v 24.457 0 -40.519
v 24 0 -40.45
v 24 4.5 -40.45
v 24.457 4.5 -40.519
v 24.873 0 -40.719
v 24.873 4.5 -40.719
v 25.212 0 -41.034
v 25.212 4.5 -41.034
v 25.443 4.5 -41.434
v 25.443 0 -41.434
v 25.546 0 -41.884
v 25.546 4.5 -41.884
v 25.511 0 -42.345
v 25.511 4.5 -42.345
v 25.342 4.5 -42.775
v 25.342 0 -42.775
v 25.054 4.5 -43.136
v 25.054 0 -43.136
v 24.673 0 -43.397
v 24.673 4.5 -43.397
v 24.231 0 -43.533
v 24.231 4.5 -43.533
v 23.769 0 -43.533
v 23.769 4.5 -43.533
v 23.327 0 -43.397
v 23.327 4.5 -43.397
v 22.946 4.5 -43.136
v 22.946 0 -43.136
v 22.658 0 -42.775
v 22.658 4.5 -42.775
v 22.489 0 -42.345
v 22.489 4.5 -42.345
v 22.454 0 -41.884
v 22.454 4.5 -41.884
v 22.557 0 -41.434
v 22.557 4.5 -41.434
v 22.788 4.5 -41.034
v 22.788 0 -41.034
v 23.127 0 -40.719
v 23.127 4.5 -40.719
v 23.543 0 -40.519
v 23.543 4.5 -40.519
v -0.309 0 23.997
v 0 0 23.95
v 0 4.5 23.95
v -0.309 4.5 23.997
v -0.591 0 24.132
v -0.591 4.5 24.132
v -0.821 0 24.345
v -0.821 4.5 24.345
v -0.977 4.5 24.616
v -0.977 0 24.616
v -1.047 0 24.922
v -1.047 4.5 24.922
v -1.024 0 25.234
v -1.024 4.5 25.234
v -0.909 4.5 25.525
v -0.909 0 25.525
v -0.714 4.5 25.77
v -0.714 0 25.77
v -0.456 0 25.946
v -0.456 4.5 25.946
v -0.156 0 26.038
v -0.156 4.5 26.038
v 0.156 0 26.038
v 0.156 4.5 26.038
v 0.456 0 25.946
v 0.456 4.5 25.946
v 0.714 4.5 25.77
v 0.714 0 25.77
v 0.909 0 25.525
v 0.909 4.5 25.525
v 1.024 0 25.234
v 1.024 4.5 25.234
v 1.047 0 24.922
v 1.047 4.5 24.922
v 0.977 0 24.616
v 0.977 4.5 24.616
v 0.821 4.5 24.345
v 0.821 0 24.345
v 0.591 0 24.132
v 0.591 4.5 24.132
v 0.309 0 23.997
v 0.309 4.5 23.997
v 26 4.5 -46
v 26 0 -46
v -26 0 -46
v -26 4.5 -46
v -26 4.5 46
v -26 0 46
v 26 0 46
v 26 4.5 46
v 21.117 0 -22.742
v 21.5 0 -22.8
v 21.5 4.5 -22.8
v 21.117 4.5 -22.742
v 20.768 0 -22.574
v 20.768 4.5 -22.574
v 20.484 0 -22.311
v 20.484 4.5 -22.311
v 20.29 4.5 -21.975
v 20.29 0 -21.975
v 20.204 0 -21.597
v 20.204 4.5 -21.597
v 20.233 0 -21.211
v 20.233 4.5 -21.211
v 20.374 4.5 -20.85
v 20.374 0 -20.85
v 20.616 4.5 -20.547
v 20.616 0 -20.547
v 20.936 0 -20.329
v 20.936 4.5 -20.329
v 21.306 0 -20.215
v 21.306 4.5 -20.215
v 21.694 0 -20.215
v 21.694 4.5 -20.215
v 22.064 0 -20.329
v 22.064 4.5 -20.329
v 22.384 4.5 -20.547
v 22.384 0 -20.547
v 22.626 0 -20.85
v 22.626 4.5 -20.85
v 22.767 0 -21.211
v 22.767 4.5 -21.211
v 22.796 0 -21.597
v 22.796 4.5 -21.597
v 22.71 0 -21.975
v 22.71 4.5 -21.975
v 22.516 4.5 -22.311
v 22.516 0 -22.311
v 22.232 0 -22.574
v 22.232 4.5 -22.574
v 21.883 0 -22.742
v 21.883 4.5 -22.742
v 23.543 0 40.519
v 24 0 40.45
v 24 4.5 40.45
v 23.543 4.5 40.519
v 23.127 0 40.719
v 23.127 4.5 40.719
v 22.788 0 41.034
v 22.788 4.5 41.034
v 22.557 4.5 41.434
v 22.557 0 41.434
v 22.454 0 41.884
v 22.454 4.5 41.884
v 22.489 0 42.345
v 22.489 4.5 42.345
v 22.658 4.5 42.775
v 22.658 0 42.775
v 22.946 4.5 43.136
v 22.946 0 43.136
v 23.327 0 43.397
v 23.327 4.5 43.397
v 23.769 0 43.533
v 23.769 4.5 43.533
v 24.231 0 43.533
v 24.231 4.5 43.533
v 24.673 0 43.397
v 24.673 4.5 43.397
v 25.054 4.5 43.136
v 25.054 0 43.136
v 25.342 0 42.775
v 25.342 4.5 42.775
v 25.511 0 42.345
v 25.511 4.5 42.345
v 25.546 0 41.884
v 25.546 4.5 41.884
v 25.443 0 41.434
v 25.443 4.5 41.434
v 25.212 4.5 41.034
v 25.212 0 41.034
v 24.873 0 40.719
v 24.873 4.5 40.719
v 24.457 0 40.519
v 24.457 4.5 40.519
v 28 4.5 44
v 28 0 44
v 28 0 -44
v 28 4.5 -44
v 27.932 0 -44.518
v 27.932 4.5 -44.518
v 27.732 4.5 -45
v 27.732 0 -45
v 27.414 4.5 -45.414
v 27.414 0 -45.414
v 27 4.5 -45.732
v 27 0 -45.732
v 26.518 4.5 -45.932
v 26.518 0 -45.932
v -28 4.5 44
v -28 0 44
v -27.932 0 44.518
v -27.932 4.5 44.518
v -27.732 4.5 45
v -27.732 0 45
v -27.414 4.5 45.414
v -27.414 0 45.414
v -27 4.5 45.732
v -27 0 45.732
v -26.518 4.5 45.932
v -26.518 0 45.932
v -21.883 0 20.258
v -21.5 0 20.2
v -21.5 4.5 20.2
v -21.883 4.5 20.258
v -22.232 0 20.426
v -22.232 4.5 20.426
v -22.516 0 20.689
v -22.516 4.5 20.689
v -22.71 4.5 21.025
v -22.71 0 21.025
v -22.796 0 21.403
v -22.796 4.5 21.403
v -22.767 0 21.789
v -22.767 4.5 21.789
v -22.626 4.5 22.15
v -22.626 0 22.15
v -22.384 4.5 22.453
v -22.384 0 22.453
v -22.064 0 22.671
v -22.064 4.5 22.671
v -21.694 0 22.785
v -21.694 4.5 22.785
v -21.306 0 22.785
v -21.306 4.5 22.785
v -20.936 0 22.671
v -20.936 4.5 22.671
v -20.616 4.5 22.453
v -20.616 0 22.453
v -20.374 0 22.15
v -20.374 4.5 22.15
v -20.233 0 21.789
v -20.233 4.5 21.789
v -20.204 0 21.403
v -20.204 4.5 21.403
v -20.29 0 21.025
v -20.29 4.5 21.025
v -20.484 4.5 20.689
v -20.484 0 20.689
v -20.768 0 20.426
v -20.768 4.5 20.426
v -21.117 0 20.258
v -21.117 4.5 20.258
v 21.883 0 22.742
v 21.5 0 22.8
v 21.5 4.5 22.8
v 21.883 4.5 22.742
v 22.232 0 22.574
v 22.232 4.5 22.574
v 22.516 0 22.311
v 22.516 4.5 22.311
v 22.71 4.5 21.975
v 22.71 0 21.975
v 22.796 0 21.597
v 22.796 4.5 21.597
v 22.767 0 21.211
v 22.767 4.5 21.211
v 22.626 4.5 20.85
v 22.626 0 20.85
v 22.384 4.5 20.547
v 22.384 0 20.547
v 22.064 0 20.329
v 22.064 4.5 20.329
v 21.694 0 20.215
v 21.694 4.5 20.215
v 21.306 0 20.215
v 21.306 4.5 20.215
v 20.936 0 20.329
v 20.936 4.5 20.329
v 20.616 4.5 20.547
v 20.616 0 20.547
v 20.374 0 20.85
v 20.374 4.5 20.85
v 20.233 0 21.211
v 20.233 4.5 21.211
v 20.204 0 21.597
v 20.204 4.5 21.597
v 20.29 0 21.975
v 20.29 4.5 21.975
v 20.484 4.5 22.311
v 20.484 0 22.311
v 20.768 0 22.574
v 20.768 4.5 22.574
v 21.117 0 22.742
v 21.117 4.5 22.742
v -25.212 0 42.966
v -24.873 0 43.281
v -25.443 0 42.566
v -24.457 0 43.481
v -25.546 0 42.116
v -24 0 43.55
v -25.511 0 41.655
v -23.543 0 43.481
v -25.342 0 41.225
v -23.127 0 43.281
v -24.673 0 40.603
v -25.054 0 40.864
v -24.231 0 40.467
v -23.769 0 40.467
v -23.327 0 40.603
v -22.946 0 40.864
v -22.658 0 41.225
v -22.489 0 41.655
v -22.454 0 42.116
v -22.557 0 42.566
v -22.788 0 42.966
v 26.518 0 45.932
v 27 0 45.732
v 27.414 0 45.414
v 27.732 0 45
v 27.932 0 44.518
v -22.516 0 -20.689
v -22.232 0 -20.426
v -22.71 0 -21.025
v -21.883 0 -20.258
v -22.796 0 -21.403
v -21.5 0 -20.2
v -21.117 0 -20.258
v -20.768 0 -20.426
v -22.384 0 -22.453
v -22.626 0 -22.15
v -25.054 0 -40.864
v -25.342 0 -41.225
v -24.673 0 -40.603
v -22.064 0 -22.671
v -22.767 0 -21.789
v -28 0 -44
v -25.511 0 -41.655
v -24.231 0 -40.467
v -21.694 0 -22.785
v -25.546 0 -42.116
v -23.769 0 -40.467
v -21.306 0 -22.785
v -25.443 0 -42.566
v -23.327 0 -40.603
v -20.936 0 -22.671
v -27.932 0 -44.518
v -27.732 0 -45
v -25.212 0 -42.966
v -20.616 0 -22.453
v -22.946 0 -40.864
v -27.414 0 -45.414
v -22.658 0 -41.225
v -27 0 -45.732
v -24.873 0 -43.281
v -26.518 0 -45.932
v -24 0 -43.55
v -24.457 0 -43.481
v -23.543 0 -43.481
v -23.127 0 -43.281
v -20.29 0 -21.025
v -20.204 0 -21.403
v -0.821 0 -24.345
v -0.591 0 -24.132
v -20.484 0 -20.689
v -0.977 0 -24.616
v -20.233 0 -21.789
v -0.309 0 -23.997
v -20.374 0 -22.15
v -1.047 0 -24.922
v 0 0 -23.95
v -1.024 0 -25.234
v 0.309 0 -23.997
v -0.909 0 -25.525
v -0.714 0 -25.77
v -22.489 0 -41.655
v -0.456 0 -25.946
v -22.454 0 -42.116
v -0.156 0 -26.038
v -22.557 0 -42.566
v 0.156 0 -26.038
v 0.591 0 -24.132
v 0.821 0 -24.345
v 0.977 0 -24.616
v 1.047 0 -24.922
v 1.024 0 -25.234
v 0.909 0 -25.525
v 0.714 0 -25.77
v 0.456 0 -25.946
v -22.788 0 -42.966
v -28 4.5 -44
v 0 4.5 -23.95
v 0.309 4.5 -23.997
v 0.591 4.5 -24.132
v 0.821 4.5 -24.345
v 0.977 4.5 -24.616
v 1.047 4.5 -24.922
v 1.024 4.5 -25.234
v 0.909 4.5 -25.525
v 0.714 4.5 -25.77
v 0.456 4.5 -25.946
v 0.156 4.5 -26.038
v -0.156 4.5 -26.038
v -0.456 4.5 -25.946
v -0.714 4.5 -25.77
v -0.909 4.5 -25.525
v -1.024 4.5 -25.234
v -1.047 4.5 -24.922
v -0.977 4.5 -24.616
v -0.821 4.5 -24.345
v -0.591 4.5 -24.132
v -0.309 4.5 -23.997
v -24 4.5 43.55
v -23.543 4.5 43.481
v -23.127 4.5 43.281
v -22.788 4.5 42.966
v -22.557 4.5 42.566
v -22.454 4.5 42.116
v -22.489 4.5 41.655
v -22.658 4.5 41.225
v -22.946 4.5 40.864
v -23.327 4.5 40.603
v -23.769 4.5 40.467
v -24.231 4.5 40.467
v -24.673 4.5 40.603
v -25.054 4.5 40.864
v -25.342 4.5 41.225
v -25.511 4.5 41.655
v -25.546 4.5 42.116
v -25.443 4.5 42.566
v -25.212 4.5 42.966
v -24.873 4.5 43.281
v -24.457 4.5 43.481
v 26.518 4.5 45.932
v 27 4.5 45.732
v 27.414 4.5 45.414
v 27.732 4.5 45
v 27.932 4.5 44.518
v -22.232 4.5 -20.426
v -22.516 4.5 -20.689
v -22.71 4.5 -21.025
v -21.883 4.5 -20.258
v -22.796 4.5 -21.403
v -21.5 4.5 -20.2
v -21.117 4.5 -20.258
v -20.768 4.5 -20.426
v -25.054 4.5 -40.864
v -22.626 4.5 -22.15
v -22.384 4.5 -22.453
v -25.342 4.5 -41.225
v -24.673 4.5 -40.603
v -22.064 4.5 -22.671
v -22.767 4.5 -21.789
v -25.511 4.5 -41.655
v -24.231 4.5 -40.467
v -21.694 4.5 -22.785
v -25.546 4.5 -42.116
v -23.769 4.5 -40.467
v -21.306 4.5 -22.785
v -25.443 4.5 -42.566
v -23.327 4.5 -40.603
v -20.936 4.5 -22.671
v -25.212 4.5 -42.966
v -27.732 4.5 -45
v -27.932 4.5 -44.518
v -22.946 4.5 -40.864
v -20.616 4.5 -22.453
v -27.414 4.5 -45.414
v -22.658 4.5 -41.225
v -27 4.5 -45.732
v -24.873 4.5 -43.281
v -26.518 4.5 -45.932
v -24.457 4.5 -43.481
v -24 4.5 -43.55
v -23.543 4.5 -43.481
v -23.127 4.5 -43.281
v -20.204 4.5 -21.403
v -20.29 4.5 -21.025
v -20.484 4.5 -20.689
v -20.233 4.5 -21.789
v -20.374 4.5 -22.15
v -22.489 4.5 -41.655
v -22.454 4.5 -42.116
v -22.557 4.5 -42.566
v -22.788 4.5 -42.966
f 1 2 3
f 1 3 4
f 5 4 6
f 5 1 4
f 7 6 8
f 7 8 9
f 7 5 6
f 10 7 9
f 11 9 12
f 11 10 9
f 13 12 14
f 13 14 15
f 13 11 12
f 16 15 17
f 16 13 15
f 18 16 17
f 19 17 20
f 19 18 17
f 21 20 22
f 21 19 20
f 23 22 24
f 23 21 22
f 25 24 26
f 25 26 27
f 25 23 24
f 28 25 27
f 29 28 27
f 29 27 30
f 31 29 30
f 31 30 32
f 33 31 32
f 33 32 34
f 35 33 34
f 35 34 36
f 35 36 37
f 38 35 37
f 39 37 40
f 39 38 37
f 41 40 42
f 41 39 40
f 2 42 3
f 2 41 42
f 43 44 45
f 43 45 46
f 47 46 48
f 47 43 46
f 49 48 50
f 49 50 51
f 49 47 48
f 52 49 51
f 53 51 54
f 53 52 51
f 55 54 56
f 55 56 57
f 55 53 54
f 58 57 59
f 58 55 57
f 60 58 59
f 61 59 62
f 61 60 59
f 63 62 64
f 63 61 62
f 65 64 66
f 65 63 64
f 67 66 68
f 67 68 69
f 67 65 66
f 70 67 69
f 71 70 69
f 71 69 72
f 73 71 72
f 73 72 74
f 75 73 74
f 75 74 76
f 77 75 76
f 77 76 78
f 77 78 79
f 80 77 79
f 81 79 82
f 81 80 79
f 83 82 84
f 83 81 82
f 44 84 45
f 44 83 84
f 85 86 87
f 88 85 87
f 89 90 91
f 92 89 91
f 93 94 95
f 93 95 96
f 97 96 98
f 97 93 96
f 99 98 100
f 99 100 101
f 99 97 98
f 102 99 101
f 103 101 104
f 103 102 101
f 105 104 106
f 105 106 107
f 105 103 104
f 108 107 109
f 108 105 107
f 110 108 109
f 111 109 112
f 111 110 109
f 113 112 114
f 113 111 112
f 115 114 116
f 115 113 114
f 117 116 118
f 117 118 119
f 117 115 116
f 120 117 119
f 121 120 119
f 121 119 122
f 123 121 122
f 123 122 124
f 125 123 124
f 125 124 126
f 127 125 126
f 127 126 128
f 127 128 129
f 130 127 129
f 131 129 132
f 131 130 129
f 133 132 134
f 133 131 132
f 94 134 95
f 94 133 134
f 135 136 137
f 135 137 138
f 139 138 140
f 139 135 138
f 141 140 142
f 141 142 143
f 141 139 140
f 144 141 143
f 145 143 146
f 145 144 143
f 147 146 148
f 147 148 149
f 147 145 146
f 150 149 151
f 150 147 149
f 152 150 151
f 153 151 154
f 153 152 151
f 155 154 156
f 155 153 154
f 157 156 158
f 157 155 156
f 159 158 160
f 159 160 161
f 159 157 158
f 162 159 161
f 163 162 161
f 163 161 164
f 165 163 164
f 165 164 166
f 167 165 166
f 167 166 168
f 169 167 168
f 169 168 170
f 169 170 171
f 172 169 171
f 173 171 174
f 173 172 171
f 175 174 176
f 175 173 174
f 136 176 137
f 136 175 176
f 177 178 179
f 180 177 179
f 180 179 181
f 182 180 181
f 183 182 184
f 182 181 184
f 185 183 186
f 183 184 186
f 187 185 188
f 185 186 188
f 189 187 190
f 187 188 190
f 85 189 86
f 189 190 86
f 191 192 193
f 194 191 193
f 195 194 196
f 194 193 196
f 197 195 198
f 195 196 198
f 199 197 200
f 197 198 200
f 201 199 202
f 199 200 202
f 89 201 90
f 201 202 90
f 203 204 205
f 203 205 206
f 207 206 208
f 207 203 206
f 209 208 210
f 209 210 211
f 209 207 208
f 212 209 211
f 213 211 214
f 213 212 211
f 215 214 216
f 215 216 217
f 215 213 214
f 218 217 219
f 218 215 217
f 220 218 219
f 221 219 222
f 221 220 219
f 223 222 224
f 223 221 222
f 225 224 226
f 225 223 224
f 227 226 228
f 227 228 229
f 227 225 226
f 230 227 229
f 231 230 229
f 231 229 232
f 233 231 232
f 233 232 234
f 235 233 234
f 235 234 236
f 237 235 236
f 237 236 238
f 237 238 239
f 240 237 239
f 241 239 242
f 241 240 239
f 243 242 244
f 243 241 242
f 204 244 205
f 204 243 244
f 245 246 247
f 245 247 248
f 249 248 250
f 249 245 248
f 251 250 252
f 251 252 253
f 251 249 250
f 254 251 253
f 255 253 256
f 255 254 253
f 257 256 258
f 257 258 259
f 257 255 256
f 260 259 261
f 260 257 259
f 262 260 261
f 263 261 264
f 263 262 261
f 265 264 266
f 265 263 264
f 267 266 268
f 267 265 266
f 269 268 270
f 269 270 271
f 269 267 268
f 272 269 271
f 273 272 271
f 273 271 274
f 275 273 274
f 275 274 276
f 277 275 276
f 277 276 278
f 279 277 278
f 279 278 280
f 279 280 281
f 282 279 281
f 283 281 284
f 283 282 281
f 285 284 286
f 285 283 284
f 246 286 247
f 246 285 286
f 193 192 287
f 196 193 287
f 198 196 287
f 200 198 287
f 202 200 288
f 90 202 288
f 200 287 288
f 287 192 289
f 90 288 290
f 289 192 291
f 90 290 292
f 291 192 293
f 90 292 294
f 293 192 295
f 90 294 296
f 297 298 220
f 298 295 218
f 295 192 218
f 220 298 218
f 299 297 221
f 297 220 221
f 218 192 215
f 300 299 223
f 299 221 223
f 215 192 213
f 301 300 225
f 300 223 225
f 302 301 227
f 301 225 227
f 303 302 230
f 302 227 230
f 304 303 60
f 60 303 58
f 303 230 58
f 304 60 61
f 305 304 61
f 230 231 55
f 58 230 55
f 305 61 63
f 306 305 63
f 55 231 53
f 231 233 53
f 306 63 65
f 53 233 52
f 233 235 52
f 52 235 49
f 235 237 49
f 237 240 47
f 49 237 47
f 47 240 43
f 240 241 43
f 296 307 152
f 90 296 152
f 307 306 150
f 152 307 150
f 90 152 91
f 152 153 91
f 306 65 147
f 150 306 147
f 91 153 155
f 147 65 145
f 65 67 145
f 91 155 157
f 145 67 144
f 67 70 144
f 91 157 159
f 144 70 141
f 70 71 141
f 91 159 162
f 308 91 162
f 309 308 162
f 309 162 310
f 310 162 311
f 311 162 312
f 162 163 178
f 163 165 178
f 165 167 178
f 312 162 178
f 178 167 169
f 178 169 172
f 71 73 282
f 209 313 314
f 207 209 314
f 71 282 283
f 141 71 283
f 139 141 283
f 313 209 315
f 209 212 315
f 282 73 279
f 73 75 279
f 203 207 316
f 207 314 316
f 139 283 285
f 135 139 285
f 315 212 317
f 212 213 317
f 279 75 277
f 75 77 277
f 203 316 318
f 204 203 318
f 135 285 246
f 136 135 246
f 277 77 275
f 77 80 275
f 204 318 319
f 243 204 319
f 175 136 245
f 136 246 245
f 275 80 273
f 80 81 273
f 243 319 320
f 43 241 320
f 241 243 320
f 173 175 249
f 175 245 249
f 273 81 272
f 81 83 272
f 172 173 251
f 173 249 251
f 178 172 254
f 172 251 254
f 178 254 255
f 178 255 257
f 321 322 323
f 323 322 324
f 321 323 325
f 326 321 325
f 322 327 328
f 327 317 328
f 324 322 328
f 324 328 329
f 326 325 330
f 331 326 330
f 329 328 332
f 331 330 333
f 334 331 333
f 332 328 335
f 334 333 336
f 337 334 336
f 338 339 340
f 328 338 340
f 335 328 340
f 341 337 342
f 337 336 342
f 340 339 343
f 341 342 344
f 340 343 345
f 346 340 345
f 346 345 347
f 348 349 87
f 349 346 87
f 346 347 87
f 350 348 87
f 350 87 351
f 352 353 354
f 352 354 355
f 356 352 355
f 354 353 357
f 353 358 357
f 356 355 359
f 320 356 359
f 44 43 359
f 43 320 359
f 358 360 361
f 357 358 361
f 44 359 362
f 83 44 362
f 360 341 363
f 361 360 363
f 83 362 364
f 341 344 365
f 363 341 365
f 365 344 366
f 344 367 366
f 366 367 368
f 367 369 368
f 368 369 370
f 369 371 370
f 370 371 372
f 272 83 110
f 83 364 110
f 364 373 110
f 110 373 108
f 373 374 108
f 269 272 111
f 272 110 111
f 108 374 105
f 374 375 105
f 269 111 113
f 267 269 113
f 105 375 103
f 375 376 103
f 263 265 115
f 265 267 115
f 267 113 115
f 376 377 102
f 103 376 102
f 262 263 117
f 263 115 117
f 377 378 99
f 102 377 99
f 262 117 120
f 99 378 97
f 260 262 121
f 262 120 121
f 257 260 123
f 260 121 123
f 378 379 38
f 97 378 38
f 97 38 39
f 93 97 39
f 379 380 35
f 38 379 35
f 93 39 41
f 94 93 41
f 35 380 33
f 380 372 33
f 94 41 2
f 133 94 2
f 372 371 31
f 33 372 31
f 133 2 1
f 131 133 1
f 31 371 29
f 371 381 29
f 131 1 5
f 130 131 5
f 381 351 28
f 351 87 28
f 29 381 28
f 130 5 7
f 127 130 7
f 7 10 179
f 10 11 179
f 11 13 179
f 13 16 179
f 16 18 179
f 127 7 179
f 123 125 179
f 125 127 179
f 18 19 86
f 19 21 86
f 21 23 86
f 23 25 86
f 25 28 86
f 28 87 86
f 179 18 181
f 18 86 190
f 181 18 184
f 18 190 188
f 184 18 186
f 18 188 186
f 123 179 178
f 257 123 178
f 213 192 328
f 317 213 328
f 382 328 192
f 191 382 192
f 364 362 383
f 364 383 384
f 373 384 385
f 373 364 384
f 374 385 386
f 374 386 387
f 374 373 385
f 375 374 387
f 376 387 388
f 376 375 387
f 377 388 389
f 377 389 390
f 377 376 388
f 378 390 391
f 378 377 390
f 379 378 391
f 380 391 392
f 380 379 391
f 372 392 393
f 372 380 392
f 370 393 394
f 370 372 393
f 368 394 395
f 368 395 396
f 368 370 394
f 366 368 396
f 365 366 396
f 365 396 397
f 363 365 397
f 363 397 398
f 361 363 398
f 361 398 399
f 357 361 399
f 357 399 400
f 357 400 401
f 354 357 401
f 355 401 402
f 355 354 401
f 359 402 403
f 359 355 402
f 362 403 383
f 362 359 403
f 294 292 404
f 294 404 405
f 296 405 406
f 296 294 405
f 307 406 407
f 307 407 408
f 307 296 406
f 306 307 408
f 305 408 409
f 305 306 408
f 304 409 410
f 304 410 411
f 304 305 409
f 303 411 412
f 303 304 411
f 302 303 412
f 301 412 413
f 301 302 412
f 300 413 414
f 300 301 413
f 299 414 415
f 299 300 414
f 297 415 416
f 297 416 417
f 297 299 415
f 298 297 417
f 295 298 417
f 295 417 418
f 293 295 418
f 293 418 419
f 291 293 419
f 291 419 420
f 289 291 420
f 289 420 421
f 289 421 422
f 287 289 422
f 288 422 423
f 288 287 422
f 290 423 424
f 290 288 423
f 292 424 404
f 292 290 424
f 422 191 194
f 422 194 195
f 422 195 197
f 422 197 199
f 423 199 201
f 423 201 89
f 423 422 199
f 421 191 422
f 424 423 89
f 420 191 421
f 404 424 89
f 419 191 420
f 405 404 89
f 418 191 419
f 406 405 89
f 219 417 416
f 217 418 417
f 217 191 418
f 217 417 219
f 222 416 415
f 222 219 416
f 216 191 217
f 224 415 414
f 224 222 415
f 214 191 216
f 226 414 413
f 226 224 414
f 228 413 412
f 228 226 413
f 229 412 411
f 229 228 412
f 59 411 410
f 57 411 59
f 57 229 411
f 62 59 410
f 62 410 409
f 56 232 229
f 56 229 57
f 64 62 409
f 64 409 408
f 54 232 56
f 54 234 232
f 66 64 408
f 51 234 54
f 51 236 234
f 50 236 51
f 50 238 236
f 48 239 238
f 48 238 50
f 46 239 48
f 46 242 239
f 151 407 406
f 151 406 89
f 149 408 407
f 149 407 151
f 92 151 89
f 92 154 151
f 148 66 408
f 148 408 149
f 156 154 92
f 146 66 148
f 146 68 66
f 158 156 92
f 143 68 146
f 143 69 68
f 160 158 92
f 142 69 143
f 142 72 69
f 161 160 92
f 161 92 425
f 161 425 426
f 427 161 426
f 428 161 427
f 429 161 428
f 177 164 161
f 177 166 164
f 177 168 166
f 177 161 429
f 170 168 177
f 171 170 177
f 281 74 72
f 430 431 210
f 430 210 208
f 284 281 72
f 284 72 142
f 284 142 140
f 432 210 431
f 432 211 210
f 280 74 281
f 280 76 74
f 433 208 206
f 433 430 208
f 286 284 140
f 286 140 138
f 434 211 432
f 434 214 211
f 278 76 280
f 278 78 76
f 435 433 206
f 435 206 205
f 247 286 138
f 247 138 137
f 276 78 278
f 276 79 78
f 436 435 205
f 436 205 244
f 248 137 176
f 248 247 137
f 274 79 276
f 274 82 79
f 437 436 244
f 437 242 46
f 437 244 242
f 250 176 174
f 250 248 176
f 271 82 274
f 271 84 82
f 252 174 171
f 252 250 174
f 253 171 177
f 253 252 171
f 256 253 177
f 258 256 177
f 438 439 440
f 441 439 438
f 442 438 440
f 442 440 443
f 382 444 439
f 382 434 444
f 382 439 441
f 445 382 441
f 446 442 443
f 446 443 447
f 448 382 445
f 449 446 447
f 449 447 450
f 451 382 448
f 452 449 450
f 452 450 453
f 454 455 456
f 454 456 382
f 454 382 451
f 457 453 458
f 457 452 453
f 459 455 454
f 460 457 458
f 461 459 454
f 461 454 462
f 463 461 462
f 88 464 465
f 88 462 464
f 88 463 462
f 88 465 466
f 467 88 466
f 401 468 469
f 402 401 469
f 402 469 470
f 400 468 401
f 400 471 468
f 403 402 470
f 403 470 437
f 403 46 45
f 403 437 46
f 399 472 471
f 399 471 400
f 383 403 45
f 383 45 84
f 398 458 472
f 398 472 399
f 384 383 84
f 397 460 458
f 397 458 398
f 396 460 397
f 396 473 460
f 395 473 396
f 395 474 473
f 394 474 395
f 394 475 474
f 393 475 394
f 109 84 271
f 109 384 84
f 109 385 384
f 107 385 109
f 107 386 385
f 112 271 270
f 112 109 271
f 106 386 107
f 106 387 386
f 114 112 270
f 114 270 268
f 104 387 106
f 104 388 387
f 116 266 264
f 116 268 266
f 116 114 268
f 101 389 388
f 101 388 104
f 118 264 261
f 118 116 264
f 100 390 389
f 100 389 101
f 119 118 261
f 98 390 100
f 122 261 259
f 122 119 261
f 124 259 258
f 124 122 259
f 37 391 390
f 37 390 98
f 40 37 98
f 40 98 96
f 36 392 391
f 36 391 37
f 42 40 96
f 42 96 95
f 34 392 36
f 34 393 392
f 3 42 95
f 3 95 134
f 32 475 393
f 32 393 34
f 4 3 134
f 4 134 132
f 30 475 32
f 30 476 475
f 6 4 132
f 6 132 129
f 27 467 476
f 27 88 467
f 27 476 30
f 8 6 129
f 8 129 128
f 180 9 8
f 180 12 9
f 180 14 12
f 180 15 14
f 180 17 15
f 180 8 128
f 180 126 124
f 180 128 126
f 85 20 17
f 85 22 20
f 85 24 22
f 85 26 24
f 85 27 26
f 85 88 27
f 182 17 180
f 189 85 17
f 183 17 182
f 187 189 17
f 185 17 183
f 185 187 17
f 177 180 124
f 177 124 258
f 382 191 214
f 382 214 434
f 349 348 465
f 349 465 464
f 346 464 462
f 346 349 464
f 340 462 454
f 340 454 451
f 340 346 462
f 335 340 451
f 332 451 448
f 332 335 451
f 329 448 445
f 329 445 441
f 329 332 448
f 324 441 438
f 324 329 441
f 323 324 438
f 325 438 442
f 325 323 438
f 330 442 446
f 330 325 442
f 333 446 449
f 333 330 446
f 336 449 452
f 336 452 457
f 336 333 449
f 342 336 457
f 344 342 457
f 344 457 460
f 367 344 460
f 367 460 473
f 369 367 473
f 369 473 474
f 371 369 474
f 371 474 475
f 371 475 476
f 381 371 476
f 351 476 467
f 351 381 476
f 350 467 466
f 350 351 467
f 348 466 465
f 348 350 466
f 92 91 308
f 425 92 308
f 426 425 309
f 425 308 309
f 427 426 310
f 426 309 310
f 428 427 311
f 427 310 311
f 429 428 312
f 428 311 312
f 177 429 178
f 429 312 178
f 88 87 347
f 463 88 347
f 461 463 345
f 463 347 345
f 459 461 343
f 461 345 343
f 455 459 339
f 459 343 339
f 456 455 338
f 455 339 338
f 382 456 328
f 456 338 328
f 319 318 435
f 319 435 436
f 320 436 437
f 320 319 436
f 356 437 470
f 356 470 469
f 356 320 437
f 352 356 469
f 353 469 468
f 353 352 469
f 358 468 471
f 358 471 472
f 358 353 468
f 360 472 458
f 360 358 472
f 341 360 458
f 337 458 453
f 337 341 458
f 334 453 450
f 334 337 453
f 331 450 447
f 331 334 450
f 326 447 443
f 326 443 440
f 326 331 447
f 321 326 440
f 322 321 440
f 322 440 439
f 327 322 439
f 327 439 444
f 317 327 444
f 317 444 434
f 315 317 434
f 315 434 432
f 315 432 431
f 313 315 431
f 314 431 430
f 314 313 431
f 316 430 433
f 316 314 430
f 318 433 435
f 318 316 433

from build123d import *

# Parameters (mm, degrees)
SKETCH1_R           = 1.55
SKETCH1_R_2         = 1.3
SKETCH1_R_3         = 1.05
BOSS_EXTRUDE1_DEPTH = 4.5


with BuildPart() as part:
    # Sketch1 → Boss-Extrude1 (new body)
    with BuildSketch(Plane(origin=(0, 0, 0), x_dir=(1, 0, 0), z_dir=(0, 1, 0))):
        with BuildLine():
            Line((-26, -46), (26, -46))
            ThreePointArc((26, -46), (27.414213562, -45.414213562), (28, -44))
            Line((28, -44), (28, 44))
            ThreePointArc((28, 44), (27.414213562, 45.414213562), (26, 46))
            Line((26, 46), (-26, 46))
            ThreePointArc((-26, 46), (-27.414213562, 45.414213562), (-28, 44))
            Line((-28, 44), (-28, -44))
            ThreePointArc((-28, -44), (-27.414213562, -45.414213562), (-26, -46))
        make_face()
        with Locations(Location((24, 42, 0), (0, 0, 270))):
            Circle(SKETCH1_R, mode=Mode.SUBTRACT)
        with Locations(Location((24, -42, 0), (0, 0, 90))):
            Circle(SKETCH1_R, mode=Mode.SUBTRACT)
        with Locations(Location((-24, 42, 0), (0, 0, 90))):
            Circle(SKETCH1_R, mode=Mode.SUBTRACT)
        with Locations(Location((-24, -42, 0), (0, 0, 270))):
            Circle(SKETCH1_R, mode=Mode.SUBTRACT)
        with Locations(Location((-21.5, 21.5, 0), (0, 0, 270))):
            Circle(SKETCH1_R_2, mode=Mode.SUBTRACT)
        with Locations(Location((21.5, 21.5, 0), (0, 0, 90))):
            Circle(SKETCH1_R_2, mode=Mode.SUBTRACT)
        with Locations(Location((21.5, -21.5, 0), (0, 0, 270))):
            Circle(SKETCH1_R_2, mode=Mode.SUBTRACT)
        with Locations(Location((-21.5, -21.5, 0), (0, 0, 90))):
            Circle(SKETCH1_R_2, mode=Mode.SUBTRACT)
        with Locations(Location((0, 25, 0), (0, 0, 270))):
            Circle(SKETCH1_R_3, mode=Mode.SUBTRACT)
        with Locations(Location((0, -25, 0), (0, 0, 90))):
            Circle(SKETCH1_R_3, mode=Mode.SUBTRACT)
    extrude(amount=BOSS_EXTRUDE1_DEPTH)


solid = part.part
